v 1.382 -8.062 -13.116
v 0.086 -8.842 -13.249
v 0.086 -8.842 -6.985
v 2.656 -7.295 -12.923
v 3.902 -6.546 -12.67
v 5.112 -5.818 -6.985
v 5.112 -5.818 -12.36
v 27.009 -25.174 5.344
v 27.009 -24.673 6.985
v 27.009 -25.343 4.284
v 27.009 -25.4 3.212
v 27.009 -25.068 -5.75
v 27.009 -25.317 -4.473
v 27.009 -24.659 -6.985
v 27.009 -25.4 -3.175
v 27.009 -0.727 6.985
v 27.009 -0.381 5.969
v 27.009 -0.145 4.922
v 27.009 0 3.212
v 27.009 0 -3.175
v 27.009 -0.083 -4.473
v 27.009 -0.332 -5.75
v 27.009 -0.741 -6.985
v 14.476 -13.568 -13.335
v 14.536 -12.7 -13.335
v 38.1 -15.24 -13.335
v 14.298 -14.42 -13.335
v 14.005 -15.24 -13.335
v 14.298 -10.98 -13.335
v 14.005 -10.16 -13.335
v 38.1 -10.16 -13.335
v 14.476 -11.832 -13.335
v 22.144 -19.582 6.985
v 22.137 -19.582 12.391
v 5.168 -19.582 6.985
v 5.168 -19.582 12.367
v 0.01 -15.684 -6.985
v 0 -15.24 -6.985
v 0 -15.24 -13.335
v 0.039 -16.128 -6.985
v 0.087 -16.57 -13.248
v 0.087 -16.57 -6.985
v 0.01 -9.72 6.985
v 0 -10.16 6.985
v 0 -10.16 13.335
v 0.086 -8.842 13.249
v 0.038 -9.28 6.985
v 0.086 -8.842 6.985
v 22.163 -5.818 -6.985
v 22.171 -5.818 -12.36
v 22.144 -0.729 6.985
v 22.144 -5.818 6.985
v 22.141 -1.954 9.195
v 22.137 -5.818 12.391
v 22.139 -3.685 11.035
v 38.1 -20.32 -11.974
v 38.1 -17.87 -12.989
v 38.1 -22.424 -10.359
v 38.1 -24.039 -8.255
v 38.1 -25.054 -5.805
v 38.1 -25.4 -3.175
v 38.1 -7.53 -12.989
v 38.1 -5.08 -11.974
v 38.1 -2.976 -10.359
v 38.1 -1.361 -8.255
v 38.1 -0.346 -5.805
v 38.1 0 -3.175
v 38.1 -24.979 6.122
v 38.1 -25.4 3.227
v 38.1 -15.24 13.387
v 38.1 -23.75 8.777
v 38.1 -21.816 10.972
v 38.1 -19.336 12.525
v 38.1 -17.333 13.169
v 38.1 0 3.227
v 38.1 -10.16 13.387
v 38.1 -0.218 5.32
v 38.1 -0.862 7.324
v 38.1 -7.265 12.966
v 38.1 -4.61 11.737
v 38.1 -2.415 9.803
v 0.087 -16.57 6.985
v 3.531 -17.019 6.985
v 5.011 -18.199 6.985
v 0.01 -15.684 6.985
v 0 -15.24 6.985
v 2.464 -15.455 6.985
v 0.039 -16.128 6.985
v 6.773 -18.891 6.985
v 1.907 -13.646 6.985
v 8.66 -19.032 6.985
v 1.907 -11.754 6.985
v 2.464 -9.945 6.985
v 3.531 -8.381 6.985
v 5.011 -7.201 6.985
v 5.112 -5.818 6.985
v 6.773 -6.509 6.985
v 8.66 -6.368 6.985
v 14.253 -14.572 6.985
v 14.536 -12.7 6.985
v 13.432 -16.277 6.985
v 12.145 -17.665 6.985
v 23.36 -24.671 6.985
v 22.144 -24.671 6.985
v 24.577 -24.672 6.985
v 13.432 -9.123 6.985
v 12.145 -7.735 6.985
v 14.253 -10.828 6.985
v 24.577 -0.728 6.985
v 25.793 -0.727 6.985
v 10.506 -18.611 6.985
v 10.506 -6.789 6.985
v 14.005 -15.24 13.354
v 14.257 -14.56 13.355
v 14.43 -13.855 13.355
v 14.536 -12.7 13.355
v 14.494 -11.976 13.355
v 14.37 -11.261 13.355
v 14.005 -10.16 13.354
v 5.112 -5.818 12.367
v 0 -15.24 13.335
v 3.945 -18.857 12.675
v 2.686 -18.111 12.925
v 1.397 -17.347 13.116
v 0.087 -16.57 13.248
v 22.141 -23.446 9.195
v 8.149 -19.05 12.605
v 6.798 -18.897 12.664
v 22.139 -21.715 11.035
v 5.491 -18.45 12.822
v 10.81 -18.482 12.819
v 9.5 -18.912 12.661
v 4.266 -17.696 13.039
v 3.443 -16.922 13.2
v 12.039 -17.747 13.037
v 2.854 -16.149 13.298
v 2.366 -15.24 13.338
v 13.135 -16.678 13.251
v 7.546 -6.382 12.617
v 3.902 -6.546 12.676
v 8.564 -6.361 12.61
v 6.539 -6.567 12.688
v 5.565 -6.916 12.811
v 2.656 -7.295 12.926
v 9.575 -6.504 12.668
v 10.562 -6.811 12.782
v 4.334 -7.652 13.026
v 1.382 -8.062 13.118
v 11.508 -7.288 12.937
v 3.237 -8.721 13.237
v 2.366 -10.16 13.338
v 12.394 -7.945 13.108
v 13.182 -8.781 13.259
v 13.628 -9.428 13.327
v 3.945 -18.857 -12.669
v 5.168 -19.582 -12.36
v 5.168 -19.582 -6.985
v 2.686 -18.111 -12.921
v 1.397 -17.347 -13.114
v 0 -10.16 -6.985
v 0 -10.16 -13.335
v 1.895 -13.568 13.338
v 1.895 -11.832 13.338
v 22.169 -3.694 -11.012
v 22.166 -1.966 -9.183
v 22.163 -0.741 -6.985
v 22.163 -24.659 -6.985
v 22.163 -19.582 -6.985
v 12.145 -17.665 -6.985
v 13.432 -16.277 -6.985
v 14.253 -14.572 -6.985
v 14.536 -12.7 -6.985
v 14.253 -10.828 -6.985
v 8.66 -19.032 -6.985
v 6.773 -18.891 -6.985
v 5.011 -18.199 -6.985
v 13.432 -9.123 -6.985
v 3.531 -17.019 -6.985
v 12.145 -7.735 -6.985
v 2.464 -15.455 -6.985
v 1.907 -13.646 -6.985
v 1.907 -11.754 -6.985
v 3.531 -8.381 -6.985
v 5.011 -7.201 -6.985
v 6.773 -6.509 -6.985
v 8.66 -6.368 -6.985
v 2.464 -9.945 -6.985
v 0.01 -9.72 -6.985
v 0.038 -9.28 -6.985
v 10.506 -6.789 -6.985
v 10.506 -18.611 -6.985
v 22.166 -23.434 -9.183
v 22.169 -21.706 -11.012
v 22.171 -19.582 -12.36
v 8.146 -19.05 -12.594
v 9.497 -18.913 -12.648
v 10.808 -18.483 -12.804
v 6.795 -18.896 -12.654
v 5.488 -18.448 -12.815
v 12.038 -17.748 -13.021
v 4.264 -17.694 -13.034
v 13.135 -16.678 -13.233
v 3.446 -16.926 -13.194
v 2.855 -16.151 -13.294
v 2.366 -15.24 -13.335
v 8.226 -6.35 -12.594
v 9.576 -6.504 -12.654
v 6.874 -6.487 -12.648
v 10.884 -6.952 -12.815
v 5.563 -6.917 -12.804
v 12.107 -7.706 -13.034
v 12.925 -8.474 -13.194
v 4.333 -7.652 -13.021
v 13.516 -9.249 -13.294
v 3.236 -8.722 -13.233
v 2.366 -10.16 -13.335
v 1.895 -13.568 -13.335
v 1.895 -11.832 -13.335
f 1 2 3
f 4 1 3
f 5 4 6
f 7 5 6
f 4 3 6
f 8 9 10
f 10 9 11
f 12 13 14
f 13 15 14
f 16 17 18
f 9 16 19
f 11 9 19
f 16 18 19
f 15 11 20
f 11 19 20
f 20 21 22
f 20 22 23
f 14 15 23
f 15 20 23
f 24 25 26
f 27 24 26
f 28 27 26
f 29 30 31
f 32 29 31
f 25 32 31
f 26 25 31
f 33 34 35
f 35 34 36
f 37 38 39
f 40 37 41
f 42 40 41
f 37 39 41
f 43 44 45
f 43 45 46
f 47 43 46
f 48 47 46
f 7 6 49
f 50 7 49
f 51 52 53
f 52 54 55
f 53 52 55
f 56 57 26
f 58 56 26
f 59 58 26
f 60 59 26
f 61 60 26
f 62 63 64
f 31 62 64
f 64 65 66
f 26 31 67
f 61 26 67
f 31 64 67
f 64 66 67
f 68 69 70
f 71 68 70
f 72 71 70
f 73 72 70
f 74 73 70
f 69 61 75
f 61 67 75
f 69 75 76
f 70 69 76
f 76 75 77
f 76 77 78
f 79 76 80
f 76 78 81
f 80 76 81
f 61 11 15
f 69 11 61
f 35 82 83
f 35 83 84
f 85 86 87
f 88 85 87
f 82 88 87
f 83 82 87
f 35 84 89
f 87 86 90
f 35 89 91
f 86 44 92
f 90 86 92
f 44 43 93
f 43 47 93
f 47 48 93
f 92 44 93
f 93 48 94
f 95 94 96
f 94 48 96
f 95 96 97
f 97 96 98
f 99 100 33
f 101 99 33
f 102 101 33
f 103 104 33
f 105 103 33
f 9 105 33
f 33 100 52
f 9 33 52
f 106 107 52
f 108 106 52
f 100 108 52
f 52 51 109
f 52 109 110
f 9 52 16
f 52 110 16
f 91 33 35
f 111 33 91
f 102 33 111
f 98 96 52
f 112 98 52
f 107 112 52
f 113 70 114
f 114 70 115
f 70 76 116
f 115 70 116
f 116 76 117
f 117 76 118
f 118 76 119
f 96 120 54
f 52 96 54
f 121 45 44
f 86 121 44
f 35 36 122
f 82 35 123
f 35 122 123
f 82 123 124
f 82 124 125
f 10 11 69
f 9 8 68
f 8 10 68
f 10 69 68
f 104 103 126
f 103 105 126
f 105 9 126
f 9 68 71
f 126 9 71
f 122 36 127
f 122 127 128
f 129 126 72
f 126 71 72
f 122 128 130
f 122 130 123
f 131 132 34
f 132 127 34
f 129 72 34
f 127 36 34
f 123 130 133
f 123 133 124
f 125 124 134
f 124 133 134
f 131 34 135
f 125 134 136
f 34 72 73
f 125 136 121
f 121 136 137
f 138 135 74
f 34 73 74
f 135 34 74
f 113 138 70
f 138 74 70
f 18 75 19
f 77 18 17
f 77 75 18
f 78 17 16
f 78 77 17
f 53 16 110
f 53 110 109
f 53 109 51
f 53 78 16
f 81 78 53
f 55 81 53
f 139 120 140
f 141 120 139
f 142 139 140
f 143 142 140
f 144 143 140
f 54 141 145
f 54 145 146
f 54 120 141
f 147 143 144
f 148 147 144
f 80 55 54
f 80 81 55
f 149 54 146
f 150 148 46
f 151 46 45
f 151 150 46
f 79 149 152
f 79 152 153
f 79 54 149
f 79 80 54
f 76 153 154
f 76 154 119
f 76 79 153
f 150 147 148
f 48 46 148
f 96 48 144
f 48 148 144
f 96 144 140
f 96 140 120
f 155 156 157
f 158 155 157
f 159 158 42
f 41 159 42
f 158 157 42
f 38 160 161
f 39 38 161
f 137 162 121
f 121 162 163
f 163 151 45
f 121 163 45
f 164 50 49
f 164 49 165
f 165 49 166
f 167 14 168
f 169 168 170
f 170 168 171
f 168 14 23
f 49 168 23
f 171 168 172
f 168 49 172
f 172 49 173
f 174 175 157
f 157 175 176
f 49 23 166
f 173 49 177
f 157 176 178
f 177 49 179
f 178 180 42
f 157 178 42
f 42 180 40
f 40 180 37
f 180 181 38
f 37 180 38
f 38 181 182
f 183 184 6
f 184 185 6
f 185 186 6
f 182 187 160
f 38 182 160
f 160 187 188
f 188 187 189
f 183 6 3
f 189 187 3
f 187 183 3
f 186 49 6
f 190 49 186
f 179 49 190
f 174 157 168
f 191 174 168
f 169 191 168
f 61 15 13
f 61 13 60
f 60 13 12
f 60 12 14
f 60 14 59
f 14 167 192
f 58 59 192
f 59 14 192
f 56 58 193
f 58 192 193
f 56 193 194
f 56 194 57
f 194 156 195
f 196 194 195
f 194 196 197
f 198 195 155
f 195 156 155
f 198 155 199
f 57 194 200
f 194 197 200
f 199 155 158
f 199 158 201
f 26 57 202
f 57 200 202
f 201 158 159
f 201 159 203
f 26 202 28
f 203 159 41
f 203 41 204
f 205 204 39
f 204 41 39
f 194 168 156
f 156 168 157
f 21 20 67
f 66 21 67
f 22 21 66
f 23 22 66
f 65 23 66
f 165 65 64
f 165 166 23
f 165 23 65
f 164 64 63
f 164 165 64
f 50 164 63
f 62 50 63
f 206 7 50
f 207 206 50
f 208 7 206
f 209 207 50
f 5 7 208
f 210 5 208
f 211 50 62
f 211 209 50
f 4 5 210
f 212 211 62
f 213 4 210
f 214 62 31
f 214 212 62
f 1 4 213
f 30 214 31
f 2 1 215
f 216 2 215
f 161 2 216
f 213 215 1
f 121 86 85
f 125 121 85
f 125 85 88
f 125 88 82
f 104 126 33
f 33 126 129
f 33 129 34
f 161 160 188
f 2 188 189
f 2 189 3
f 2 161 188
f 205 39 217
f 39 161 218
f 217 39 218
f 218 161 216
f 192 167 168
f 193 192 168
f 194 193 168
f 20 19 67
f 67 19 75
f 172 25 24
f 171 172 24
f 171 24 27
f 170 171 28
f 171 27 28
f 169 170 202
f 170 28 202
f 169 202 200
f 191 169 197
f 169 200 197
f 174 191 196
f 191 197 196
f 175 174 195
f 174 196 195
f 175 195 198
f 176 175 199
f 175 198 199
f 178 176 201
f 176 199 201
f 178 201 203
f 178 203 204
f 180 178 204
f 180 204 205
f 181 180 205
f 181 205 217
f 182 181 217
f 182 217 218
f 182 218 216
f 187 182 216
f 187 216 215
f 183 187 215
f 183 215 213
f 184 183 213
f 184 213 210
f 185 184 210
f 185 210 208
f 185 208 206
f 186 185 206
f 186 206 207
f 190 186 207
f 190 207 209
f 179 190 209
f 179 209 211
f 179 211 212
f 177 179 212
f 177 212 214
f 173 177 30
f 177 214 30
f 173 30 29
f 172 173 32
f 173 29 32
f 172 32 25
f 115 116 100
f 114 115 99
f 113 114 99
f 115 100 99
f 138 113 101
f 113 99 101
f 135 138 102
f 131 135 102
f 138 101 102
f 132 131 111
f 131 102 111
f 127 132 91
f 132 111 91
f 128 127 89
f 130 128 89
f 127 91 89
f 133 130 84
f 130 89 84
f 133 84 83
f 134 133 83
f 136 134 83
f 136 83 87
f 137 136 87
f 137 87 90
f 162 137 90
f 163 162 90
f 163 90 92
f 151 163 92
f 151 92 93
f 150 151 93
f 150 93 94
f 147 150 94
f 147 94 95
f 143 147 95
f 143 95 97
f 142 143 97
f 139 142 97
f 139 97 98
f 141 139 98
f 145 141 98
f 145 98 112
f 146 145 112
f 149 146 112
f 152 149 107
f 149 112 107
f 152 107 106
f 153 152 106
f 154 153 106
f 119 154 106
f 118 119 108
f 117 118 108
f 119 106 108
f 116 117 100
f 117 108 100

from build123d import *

# Parameters (mm, degrees)
F1_DEPTH    = 25.4
F3_R        = 10.16
F2_R        = 6.35
F4_DEPTH    = 26.7233065934
F6_DEPTH    = 26.7232814104
F7_T1_DEPTH = 66.7645981405
F7_T3_DEPTH = 66.7279267596
F9_DEPTH    = 50.8


# Not quite as in the source:
# - a fillet or chamfer that OpenCascade refuses, or shapes differently, is made with other operations: its cross-section is extruded or revolved along the edge and cut away or added


with BuildPart() as f1:
    # F0 (on Front) → F1 (new body)
    with BuildSketch(Plane.XZ):
        Polygon((27.0092859864, -6.985), (19.05, -6.985), (0, -6.985), (0, -13.335), (38.1, -13.335), (38.1, 13.3873065934), (0, 13.335), (0, 6.985), (19.05, 6.985), (27.0092859864, 6.985), align=None)
    extrude(amount=F1_DEPTH)

    # F3
    f3_edges = [f1.edges().sort_by_distance(p)[0] for p in [
        (0, 0, -10.16),
        (0, 0, 10.16),
        (0, -25.4, 10.16),
        (0, -25.4, -10.16),
    ]]
    fillet(f3_edges, radius=F3_R)

    # F2 (on face) → F4 (cut, through all)
    with BuildSketch(Plane(origin=(0, 0, -13.335), x_dir=(1, 0, 0), z_dir=(0, 0, -1))):
        with Locations((8.1856111065, 12.7)):
            Circle(F2_R)
    extrude(amount=-F4_DEPTH, mode=Mode.SUBTRACT)

    # F5 (on face) → F6 (cut, through all)
    with BuildSketch(Plane(origin=(-0.0183072732, 0, 13.3349748664), x_dir=(0.9999990576, 0, 0.0013728752), z_dir=(-0.0013728752, 0, 0.9999990576))):
        with BuildLine():
            Line((20.423270762, 6.0135265812), (-7.3266747168, -5.8177547927))
            Line((-7.3266747168, -5.8177547927), (0.9929662687, -5.8177547927))
            add(Edge.make_bspline(
                [(10.1783168652, 0), (3.7432331436, 0), (0.9929662687, -5.8177547927)],
                knots=[4.7123889804, 4.7123889804, 4.7123889804, 5.8269772874, 5.8269772874, 5.8269772874], degree=2, weights=[1, 0.792172065, 0.879280631]))
            Line((10.1783168652, 0), (22.1537450551, 0))
            Line((22.1537450551, 0), (20.423270762, 6.0135265812))
        make_face()
        with BuildLine():
            add(Edge.make_bspline(
                [(10.1783168652, 0), (3.7432331436, 0), (0.9929662687, -5.8177547927)],
                knots=[4.7123889804, 4.7123889804, 4.7123889804, 5.8269772874, 5.8269772874, 5.8269772874], degree=2, weights=[1, 0.792172065, 0.879280631]))
            Line((0.9929662687, -5.8177547927), (22.1537450551, -5.8177547927))
            Line((22.1537450551, -5.8177547927), (22.1537450551, 0))
            Line((22.1537450551, 0), (10.1783168652, 0))
        make_face()
        with BuildLine():
            Line((22.1537450551, -25.4), (22.1537450551, -19.5822452073))
            Line((22.1537450551, -19.5822452073), (0.9929662687, -19.5822452073))
            add(Edge.make_bspline(
                [(0.9929662687, -19.5822452073), (3.7432331436, -25.4), (10.1783168652, -25.4)],
                knots=[0.4562080198, 0.4562080198, 0.4562080198, 1.5707963268, 1.5707963268, 1.5707963268], degree=2, weights=[0.879280631, 0.792172065, 1]))
            Line((10.1783168652, -25.4), (22.1537450551, -25.4))
        make_face()
        with BuildLine():
            Line((0.9929662687, -19.5822452073), (-6.3022147662, -19.5822452073))
            Line((-6.3022147662, -19.5822452073), (17.9763548076, -30.6573584676))
            Line((17.9763548076, -30.6573584676), (22.1537450551, -25.4))
            Line((22.1537450551, -25.4), (10.1783168652, -25.4))
            add(Edge.make_bspline(
                [(0.9929662687, -19.5822452073), (3.7432331436, -25.4), (10.1783168652, -25.4)],
                knots=[0.4562080198, 0.4562080198, 0.4562080198, 1.5707963268, 1.5707963268, 1.5707963268], degree=2, weights=[0.879280631, 0.792172065, 1]))
        make_face()
    extrude(amount=-F6_DEPTH, mode=Mode.SUBTRACT)

    # F7: fillet of radius 10.16 on 4 edges, made by hand

    # F7_s2 → F7_t1 (cut)
    with BuildSketch(Plane(origin=(63.5182833364, 0, 0.0872027564), x_dir=(0, 1, 0), z_dir=(-0.9999990576, 0, -0.0013728752))):
        with BuildLine():
            ThreePointArc((-25.4, -3.1749874332), (-22.4242048969, -10.35919233), (-15.24, -13.3349874332))
            Line((-15.24, -13.3349874332), (-25.4, -13.3349874332))
            Line((-25.4, -13.3349874332), (-25.4, -3.1749874332))
        make_face()
        with BuildLine():
            ThreePointArc((0, -3.1749874332), (-2.9757951031, -10.35919233), (-10.16, -13.3349874332))
            Line((-10.16, -13.3349874332), (0, -13.3349874332))
            Line((0, -13.3349874332), (0, -3.1749874332))
        make_face()
    extrude(amount=F7_T1_DEPTH, mode=Mode.SUBTRACT)

    # F7_s4 → F7_t3 (cut)
    with BuildSketch(Plane.YZ.offset(-3.2279267596)):
        with BuildLine():
            ThreePointArc((0, -3.175), (-2.9757951031, -10.3592048969), (-10.16, -13.335))
            Line((-10.16, -13.335), (0, -13.335))
            Line((0, -13.335), (0, -3.175))
        make_face()
        with BuildLine():
            ThreePointArc((-25.4, -3.175), (-22.4242048969, -10.3592048969), (-15.24, -13.335))
            Line((-15.24, -13.335), (-25.4, -13.335))
            Line((-25.4, -13.335), (-25.4, -3.175))
        make_face()
    extrude(amount=F7_T3_DEPTH, mode=Mode.SUBTRACT)

    # F8 (on Top) → F9 (cut, symmetric)
    with BuildSketch(Plane.XY):
        Polygon((-2.6969234459, -10.516657494), (6.3479291275, -5.0737368874), (-5.7385554537, -5.0737368874), (-5.7385554537, -20.2818978578), (6.3479291275, -20.2818978578), (-2.6969234459, -14.9190193042), align=None)
    extrude(amount=F9_DEPTH, both=True, mode=Mode.SUBTRACT)


solid = f1.part
